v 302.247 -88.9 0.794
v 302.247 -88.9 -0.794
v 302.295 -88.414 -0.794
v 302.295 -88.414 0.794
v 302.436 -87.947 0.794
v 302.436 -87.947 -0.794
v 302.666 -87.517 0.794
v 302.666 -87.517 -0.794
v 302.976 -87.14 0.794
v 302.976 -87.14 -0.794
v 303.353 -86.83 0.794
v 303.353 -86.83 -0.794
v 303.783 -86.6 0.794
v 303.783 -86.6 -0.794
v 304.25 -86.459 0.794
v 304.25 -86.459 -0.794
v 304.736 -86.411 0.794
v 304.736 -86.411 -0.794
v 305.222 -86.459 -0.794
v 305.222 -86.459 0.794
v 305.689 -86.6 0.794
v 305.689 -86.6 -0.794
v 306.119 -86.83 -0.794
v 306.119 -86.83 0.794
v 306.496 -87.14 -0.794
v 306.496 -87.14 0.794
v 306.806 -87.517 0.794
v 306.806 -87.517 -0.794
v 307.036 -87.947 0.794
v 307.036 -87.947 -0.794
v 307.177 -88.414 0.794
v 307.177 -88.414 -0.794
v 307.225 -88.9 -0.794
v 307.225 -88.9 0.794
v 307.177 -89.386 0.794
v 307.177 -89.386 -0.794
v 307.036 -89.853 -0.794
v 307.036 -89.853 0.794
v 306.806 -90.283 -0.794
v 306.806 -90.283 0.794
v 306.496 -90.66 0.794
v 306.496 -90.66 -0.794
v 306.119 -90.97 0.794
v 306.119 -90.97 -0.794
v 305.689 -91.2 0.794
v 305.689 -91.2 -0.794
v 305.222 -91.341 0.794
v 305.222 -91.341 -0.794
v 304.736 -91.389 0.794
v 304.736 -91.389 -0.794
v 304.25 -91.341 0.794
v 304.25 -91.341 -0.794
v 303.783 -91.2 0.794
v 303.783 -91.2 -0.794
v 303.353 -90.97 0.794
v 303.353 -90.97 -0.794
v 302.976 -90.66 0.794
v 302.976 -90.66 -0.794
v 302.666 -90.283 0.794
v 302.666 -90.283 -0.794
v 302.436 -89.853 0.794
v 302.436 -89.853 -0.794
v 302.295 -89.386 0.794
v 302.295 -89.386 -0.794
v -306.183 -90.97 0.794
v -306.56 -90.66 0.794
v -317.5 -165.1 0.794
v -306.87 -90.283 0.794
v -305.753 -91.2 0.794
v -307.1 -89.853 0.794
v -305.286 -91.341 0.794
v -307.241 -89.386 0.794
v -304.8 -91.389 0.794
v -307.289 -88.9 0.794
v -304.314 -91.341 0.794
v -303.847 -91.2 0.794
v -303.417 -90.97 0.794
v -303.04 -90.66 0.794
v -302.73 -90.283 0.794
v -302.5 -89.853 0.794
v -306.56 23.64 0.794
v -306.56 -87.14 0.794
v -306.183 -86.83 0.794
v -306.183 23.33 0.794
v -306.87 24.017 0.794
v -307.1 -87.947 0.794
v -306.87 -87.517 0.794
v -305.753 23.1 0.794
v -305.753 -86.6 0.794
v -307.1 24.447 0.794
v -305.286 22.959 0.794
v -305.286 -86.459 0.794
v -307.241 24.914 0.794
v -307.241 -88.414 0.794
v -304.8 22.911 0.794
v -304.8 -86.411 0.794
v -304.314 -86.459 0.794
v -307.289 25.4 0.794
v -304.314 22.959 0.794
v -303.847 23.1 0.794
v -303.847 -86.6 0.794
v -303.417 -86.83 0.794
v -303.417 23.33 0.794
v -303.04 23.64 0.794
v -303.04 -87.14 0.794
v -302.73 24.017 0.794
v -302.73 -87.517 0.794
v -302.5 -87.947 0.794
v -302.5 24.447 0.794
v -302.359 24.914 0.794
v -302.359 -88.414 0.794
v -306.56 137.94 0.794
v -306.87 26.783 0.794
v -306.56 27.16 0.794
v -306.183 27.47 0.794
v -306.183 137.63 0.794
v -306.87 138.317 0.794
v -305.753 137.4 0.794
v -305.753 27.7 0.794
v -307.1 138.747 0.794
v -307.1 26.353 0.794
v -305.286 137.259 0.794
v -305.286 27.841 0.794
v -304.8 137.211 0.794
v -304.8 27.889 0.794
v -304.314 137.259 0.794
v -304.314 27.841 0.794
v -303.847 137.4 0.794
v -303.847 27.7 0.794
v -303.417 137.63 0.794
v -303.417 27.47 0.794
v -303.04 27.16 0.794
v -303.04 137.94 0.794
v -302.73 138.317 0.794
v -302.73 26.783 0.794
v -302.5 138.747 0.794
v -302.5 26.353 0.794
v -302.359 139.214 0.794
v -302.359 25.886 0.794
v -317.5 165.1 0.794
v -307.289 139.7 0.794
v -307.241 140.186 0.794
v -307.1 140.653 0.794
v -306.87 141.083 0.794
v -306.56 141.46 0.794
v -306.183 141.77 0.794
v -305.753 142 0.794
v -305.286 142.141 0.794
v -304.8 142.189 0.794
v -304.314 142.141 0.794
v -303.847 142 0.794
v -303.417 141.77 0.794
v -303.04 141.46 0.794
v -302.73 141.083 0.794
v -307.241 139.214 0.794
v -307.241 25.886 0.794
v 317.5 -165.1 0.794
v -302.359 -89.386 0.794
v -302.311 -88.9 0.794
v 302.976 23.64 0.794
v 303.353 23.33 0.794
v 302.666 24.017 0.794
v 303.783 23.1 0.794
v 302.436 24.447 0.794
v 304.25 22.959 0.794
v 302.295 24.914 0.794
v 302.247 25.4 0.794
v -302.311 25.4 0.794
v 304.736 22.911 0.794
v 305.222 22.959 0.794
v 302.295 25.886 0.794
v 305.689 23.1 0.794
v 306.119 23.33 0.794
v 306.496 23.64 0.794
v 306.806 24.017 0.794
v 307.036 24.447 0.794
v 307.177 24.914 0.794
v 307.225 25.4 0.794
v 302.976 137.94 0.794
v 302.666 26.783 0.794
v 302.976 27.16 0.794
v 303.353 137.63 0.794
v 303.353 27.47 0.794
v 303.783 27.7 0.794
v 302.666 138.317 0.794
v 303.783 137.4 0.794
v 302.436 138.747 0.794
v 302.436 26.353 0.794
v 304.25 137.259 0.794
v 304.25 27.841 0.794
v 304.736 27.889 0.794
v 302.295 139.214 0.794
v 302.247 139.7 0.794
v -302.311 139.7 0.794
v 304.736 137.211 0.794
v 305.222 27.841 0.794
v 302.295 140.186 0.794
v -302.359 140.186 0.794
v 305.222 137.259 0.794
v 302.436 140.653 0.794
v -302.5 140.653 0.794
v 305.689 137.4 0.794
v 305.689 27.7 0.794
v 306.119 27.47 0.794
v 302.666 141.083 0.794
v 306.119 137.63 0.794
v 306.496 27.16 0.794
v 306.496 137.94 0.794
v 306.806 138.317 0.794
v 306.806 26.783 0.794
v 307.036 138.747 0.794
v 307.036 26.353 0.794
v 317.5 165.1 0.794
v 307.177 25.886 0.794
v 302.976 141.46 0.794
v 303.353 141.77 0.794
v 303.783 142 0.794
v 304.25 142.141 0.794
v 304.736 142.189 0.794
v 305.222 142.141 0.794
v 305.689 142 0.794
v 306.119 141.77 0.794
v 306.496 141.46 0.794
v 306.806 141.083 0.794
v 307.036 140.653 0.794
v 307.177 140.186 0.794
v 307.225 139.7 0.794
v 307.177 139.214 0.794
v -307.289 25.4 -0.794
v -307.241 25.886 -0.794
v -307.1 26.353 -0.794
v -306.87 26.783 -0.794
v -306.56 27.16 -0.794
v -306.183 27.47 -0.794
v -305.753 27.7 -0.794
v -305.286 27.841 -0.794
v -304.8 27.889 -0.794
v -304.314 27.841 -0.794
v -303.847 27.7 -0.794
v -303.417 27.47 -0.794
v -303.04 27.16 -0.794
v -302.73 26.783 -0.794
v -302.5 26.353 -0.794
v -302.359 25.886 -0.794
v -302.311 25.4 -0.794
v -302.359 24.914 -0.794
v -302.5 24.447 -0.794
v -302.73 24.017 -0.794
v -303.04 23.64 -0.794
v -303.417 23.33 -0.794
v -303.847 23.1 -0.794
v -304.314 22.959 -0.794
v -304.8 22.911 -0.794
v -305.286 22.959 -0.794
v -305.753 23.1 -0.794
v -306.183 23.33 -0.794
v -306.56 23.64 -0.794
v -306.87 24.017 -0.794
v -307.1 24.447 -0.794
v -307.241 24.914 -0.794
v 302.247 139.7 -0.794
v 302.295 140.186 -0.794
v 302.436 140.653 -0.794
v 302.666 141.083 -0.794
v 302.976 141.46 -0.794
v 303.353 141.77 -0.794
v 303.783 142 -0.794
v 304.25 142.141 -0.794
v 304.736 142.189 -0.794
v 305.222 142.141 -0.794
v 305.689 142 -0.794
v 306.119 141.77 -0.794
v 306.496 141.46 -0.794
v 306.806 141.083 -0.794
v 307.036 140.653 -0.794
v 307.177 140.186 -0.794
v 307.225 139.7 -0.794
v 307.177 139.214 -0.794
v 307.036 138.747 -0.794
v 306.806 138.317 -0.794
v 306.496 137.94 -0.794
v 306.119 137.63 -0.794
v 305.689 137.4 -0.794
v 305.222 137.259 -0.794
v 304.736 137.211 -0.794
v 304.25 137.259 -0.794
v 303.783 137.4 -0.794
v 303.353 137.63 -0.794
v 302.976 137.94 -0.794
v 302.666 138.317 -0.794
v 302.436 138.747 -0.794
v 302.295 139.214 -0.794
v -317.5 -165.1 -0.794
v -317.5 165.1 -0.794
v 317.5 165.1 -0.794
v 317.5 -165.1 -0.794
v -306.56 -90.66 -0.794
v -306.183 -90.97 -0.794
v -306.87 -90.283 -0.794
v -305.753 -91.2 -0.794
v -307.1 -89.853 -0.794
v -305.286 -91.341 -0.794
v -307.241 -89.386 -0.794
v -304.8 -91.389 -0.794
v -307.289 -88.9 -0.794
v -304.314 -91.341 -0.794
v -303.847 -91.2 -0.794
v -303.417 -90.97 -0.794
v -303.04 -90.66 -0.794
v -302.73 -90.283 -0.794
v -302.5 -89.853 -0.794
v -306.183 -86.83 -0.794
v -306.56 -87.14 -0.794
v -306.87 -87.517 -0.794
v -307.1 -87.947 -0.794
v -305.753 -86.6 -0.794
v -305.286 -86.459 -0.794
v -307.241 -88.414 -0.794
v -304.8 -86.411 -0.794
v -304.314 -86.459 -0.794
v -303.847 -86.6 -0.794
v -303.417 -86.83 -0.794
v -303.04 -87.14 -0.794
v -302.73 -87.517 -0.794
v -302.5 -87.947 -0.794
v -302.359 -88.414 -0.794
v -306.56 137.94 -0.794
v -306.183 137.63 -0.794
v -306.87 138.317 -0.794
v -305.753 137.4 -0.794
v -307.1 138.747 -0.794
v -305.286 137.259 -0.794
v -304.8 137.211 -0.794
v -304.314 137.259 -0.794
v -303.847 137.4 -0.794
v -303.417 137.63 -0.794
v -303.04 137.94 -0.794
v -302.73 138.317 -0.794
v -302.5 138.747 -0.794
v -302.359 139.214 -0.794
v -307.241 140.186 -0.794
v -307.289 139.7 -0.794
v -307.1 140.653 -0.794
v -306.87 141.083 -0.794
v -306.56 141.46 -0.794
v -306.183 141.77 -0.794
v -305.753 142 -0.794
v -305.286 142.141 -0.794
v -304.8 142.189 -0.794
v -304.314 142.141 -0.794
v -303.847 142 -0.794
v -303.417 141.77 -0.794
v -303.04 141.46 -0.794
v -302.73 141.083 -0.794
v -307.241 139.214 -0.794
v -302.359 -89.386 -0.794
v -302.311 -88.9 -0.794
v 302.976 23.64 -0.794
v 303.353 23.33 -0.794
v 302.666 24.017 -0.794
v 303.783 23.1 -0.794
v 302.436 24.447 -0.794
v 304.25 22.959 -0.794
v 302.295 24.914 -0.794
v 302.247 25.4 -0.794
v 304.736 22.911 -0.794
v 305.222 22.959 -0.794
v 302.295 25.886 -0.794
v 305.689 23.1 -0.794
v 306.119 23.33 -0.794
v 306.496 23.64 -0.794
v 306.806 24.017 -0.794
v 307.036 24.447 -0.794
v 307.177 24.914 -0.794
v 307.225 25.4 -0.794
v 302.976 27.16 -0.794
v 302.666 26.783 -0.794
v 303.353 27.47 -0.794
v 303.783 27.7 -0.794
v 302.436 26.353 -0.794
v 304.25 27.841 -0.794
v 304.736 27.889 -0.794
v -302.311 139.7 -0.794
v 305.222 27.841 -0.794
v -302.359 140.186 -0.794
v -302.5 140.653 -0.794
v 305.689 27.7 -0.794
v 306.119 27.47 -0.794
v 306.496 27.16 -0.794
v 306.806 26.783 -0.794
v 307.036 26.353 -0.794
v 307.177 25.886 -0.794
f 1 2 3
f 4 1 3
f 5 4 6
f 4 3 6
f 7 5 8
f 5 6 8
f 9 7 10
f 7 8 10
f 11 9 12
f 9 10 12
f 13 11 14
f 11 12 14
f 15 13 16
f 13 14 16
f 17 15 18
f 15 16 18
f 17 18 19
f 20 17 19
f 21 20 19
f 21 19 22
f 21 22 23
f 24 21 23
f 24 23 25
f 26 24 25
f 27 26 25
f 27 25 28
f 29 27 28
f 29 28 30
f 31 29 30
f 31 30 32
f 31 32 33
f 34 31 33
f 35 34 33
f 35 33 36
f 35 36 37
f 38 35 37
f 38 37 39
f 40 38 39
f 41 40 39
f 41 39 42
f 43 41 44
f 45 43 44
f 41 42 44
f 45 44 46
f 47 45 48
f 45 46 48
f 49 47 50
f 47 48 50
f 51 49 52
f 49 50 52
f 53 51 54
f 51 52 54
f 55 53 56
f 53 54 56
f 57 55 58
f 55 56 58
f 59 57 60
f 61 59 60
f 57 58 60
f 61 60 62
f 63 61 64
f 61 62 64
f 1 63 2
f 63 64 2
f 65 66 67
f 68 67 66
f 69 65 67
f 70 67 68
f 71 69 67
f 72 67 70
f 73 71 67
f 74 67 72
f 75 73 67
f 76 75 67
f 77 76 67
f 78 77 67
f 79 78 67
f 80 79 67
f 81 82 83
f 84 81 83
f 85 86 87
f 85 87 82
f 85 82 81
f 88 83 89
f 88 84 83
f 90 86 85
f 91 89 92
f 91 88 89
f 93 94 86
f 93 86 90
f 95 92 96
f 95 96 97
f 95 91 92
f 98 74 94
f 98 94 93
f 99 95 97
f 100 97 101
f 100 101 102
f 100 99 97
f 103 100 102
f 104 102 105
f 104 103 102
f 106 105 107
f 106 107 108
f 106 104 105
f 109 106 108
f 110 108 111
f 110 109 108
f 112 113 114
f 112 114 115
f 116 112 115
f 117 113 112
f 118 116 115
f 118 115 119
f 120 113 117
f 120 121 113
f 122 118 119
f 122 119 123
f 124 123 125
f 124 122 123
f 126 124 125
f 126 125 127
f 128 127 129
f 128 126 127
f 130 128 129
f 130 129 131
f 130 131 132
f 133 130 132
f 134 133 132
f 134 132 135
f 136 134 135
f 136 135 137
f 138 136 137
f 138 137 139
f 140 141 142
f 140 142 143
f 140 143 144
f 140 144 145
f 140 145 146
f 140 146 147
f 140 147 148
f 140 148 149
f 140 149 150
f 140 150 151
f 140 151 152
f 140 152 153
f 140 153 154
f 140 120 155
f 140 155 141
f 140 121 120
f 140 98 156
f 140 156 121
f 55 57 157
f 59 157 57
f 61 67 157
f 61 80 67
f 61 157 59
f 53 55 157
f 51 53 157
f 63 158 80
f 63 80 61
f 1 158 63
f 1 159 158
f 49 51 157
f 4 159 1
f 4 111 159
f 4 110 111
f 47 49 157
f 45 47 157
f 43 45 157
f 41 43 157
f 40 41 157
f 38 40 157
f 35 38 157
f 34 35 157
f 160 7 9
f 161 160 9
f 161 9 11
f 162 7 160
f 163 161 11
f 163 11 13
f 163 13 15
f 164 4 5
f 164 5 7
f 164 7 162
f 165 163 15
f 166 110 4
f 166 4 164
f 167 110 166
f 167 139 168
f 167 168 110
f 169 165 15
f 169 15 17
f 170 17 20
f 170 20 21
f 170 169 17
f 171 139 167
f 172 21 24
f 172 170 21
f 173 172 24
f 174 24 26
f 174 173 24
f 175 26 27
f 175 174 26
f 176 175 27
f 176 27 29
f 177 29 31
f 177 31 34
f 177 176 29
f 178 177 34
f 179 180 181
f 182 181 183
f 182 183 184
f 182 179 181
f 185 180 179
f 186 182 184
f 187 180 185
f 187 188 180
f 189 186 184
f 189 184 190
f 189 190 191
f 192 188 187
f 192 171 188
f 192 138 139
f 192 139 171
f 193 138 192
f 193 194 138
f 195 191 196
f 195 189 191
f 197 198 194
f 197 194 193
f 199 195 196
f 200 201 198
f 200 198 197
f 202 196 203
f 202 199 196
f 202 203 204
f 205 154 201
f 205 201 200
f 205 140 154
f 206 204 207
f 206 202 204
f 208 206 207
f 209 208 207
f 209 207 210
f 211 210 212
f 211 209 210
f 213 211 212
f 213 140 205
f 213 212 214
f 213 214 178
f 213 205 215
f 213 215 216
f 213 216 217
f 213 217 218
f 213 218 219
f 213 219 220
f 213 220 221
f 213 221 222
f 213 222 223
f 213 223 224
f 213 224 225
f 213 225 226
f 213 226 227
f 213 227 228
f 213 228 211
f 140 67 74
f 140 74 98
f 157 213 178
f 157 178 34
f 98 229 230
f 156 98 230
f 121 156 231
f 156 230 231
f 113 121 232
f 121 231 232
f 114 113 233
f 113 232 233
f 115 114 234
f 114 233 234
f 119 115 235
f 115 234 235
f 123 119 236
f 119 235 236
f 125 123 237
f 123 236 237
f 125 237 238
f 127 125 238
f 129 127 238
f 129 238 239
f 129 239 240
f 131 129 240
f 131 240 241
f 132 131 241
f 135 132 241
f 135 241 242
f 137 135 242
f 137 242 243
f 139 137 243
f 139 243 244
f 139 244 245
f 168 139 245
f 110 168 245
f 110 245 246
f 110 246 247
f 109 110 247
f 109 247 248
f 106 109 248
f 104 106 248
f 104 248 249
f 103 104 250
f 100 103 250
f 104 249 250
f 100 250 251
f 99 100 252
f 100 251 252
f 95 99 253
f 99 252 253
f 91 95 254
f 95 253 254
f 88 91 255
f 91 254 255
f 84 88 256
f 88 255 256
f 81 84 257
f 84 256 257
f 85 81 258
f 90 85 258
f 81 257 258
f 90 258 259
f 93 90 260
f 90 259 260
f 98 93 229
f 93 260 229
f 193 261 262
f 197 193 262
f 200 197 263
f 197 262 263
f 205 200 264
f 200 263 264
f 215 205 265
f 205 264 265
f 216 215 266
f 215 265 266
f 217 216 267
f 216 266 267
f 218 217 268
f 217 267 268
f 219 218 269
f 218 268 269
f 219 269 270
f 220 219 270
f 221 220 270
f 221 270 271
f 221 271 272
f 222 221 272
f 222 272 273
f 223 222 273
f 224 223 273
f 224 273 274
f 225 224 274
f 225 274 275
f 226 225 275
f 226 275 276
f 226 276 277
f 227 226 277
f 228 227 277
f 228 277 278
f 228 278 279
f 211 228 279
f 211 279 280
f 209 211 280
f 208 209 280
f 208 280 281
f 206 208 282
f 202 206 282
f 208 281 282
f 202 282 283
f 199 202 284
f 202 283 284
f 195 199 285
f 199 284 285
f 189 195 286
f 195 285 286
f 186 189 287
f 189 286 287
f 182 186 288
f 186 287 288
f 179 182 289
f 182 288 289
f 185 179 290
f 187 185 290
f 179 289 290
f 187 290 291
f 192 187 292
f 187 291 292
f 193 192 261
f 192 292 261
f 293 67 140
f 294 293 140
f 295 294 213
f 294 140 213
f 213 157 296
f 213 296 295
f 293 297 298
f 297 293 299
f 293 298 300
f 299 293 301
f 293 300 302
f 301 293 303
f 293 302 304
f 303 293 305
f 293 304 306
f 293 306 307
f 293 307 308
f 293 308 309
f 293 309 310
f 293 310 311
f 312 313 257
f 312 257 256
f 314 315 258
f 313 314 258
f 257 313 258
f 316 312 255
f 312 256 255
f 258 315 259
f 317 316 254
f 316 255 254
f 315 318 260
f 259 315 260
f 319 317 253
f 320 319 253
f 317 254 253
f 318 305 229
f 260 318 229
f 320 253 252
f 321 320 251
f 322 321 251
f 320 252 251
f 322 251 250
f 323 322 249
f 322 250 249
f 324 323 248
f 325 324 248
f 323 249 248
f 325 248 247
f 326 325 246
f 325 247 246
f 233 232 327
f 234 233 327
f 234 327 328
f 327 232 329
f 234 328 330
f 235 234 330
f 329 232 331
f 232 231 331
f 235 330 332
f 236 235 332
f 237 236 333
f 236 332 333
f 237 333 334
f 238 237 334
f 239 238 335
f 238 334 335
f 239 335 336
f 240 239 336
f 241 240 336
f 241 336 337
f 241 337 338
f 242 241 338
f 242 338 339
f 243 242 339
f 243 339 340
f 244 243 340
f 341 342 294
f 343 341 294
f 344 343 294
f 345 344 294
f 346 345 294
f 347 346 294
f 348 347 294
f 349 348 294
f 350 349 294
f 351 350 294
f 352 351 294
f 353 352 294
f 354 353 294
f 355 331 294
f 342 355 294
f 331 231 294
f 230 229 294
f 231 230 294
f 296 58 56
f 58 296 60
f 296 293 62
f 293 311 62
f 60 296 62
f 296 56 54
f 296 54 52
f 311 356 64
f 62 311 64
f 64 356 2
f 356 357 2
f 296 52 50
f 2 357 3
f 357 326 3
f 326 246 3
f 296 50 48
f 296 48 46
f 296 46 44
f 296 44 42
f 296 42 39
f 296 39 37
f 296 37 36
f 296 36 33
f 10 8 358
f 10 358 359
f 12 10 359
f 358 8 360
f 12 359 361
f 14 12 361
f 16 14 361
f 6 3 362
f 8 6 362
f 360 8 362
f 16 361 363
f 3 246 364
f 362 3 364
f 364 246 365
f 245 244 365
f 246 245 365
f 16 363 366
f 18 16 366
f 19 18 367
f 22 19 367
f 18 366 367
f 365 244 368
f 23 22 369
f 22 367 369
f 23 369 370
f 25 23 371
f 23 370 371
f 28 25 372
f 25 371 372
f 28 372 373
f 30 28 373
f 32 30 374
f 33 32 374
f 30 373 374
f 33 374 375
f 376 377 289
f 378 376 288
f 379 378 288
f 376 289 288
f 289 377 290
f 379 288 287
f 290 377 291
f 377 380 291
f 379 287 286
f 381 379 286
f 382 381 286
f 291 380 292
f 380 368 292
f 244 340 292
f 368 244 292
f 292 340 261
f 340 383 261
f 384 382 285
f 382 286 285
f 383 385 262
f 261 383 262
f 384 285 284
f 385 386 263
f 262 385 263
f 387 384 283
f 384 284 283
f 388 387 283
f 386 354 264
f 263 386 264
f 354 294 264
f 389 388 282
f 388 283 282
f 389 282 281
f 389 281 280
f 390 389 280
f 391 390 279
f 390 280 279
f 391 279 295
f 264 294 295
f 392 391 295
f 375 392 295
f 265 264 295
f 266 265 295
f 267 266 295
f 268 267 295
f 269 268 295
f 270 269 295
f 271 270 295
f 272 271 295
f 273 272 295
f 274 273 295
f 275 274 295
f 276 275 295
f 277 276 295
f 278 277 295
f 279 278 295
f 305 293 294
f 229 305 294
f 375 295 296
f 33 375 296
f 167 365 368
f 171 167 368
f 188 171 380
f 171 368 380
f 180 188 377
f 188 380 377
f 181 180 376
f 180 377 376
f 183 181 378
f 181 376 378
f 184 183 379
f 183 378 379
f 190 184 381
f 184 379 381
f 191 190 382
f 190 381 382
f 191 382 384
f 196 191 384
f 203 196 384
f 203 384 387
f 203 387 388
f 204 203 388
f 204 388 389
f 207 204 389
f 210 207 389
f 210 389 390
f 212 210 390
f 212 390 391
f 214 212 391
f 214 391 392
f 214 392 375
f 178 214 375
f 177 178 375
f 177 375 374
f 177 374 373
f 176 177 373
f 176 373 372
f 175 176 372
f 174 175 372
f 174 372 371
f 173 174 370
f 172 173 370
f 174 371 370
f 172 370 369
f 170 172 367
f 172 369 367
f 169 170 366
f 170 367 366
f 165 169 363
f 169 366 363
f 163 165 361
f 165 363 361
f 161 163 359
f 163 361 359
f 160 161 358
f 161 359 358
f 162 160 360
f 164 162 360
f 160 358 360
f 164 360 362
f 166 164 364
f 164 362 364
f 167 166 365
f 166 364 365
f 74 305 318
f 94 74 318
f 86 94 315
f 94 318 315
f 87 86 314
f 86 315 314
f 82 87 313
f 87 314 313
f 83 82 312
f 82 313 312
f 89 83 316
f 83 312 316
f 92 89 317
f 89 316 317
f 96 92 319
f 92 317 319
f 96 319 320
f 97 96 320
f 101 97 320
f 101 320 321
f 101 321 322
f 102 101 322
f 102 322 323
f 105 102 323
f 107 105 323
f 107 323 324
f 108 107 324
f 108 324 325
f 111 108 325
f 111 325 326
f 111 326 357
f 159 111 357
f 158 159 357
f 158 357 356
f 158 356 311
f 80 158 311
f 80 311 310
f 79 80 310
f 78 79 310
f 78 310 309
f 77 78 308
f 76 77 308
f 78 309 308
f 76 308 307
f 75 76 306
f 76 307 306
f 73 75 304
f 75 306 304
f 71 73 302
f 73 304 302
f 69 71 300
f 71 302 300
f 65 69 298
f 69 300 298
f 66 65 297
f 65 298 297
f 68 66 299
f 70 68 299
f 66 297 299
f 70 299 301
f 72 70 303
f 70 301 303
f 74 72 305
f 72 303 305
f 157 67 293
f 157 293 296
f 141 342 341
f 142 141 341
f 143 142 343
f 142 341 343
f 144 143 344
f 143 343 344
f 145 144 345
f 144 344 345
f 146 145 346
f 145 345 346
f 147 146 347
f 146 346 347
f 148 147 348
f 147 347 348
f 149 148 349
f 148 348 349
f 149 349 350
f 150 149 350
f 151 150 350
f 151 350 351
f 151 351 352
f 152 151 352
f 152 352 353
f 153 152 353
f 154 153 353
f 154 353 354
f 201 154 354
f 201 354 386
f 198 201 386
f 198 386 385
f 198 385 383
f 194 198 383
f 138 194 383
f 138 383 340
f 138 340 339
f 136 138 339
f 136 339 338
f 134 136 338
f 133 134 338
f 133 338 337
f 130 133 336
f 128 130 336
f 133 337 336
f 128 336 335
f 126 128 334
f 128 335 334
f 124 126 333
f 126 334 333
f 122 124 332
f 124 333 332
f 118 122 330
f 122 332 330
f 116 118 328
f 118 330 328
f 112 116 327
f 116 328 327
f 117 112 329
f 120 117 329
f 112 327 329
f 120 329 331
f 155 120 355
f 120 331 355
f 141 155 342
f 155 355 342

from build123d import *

# Parameters (mm, degrees)
SKETCH3_W              = 635
SKETCH3_H              = 330.2
BOSS_EXTRUDE1_DEPTH    = 0.79375
F_10_CLEARANCE_HOLE1_D = 4.9784


with BuildPart() as part:
    # Sketch3 → Boss-Extrude1 (new, symmetric)
    with BuildSketch(Plane.XY):
        Rectangle(SKETCH3_W, SKETCH3_H)
    extrude(amount=BOSS_EXTRUDE1_DEPTH, both=True)

    # #10 Clearance Hole1 (through all)
    with Locations(Plane.XY.offset(0.79375)):
        with Locations((-304.8, 139.7), (-304.8, 25.4), (-304.8, -88.9), (304.735940926, 139.7), (304.735940926, 25.4), (304.735940926, -88.9)):
            Hole(F_10_CLEARANCE_HOLE1_D / 2)


solid = part.part
